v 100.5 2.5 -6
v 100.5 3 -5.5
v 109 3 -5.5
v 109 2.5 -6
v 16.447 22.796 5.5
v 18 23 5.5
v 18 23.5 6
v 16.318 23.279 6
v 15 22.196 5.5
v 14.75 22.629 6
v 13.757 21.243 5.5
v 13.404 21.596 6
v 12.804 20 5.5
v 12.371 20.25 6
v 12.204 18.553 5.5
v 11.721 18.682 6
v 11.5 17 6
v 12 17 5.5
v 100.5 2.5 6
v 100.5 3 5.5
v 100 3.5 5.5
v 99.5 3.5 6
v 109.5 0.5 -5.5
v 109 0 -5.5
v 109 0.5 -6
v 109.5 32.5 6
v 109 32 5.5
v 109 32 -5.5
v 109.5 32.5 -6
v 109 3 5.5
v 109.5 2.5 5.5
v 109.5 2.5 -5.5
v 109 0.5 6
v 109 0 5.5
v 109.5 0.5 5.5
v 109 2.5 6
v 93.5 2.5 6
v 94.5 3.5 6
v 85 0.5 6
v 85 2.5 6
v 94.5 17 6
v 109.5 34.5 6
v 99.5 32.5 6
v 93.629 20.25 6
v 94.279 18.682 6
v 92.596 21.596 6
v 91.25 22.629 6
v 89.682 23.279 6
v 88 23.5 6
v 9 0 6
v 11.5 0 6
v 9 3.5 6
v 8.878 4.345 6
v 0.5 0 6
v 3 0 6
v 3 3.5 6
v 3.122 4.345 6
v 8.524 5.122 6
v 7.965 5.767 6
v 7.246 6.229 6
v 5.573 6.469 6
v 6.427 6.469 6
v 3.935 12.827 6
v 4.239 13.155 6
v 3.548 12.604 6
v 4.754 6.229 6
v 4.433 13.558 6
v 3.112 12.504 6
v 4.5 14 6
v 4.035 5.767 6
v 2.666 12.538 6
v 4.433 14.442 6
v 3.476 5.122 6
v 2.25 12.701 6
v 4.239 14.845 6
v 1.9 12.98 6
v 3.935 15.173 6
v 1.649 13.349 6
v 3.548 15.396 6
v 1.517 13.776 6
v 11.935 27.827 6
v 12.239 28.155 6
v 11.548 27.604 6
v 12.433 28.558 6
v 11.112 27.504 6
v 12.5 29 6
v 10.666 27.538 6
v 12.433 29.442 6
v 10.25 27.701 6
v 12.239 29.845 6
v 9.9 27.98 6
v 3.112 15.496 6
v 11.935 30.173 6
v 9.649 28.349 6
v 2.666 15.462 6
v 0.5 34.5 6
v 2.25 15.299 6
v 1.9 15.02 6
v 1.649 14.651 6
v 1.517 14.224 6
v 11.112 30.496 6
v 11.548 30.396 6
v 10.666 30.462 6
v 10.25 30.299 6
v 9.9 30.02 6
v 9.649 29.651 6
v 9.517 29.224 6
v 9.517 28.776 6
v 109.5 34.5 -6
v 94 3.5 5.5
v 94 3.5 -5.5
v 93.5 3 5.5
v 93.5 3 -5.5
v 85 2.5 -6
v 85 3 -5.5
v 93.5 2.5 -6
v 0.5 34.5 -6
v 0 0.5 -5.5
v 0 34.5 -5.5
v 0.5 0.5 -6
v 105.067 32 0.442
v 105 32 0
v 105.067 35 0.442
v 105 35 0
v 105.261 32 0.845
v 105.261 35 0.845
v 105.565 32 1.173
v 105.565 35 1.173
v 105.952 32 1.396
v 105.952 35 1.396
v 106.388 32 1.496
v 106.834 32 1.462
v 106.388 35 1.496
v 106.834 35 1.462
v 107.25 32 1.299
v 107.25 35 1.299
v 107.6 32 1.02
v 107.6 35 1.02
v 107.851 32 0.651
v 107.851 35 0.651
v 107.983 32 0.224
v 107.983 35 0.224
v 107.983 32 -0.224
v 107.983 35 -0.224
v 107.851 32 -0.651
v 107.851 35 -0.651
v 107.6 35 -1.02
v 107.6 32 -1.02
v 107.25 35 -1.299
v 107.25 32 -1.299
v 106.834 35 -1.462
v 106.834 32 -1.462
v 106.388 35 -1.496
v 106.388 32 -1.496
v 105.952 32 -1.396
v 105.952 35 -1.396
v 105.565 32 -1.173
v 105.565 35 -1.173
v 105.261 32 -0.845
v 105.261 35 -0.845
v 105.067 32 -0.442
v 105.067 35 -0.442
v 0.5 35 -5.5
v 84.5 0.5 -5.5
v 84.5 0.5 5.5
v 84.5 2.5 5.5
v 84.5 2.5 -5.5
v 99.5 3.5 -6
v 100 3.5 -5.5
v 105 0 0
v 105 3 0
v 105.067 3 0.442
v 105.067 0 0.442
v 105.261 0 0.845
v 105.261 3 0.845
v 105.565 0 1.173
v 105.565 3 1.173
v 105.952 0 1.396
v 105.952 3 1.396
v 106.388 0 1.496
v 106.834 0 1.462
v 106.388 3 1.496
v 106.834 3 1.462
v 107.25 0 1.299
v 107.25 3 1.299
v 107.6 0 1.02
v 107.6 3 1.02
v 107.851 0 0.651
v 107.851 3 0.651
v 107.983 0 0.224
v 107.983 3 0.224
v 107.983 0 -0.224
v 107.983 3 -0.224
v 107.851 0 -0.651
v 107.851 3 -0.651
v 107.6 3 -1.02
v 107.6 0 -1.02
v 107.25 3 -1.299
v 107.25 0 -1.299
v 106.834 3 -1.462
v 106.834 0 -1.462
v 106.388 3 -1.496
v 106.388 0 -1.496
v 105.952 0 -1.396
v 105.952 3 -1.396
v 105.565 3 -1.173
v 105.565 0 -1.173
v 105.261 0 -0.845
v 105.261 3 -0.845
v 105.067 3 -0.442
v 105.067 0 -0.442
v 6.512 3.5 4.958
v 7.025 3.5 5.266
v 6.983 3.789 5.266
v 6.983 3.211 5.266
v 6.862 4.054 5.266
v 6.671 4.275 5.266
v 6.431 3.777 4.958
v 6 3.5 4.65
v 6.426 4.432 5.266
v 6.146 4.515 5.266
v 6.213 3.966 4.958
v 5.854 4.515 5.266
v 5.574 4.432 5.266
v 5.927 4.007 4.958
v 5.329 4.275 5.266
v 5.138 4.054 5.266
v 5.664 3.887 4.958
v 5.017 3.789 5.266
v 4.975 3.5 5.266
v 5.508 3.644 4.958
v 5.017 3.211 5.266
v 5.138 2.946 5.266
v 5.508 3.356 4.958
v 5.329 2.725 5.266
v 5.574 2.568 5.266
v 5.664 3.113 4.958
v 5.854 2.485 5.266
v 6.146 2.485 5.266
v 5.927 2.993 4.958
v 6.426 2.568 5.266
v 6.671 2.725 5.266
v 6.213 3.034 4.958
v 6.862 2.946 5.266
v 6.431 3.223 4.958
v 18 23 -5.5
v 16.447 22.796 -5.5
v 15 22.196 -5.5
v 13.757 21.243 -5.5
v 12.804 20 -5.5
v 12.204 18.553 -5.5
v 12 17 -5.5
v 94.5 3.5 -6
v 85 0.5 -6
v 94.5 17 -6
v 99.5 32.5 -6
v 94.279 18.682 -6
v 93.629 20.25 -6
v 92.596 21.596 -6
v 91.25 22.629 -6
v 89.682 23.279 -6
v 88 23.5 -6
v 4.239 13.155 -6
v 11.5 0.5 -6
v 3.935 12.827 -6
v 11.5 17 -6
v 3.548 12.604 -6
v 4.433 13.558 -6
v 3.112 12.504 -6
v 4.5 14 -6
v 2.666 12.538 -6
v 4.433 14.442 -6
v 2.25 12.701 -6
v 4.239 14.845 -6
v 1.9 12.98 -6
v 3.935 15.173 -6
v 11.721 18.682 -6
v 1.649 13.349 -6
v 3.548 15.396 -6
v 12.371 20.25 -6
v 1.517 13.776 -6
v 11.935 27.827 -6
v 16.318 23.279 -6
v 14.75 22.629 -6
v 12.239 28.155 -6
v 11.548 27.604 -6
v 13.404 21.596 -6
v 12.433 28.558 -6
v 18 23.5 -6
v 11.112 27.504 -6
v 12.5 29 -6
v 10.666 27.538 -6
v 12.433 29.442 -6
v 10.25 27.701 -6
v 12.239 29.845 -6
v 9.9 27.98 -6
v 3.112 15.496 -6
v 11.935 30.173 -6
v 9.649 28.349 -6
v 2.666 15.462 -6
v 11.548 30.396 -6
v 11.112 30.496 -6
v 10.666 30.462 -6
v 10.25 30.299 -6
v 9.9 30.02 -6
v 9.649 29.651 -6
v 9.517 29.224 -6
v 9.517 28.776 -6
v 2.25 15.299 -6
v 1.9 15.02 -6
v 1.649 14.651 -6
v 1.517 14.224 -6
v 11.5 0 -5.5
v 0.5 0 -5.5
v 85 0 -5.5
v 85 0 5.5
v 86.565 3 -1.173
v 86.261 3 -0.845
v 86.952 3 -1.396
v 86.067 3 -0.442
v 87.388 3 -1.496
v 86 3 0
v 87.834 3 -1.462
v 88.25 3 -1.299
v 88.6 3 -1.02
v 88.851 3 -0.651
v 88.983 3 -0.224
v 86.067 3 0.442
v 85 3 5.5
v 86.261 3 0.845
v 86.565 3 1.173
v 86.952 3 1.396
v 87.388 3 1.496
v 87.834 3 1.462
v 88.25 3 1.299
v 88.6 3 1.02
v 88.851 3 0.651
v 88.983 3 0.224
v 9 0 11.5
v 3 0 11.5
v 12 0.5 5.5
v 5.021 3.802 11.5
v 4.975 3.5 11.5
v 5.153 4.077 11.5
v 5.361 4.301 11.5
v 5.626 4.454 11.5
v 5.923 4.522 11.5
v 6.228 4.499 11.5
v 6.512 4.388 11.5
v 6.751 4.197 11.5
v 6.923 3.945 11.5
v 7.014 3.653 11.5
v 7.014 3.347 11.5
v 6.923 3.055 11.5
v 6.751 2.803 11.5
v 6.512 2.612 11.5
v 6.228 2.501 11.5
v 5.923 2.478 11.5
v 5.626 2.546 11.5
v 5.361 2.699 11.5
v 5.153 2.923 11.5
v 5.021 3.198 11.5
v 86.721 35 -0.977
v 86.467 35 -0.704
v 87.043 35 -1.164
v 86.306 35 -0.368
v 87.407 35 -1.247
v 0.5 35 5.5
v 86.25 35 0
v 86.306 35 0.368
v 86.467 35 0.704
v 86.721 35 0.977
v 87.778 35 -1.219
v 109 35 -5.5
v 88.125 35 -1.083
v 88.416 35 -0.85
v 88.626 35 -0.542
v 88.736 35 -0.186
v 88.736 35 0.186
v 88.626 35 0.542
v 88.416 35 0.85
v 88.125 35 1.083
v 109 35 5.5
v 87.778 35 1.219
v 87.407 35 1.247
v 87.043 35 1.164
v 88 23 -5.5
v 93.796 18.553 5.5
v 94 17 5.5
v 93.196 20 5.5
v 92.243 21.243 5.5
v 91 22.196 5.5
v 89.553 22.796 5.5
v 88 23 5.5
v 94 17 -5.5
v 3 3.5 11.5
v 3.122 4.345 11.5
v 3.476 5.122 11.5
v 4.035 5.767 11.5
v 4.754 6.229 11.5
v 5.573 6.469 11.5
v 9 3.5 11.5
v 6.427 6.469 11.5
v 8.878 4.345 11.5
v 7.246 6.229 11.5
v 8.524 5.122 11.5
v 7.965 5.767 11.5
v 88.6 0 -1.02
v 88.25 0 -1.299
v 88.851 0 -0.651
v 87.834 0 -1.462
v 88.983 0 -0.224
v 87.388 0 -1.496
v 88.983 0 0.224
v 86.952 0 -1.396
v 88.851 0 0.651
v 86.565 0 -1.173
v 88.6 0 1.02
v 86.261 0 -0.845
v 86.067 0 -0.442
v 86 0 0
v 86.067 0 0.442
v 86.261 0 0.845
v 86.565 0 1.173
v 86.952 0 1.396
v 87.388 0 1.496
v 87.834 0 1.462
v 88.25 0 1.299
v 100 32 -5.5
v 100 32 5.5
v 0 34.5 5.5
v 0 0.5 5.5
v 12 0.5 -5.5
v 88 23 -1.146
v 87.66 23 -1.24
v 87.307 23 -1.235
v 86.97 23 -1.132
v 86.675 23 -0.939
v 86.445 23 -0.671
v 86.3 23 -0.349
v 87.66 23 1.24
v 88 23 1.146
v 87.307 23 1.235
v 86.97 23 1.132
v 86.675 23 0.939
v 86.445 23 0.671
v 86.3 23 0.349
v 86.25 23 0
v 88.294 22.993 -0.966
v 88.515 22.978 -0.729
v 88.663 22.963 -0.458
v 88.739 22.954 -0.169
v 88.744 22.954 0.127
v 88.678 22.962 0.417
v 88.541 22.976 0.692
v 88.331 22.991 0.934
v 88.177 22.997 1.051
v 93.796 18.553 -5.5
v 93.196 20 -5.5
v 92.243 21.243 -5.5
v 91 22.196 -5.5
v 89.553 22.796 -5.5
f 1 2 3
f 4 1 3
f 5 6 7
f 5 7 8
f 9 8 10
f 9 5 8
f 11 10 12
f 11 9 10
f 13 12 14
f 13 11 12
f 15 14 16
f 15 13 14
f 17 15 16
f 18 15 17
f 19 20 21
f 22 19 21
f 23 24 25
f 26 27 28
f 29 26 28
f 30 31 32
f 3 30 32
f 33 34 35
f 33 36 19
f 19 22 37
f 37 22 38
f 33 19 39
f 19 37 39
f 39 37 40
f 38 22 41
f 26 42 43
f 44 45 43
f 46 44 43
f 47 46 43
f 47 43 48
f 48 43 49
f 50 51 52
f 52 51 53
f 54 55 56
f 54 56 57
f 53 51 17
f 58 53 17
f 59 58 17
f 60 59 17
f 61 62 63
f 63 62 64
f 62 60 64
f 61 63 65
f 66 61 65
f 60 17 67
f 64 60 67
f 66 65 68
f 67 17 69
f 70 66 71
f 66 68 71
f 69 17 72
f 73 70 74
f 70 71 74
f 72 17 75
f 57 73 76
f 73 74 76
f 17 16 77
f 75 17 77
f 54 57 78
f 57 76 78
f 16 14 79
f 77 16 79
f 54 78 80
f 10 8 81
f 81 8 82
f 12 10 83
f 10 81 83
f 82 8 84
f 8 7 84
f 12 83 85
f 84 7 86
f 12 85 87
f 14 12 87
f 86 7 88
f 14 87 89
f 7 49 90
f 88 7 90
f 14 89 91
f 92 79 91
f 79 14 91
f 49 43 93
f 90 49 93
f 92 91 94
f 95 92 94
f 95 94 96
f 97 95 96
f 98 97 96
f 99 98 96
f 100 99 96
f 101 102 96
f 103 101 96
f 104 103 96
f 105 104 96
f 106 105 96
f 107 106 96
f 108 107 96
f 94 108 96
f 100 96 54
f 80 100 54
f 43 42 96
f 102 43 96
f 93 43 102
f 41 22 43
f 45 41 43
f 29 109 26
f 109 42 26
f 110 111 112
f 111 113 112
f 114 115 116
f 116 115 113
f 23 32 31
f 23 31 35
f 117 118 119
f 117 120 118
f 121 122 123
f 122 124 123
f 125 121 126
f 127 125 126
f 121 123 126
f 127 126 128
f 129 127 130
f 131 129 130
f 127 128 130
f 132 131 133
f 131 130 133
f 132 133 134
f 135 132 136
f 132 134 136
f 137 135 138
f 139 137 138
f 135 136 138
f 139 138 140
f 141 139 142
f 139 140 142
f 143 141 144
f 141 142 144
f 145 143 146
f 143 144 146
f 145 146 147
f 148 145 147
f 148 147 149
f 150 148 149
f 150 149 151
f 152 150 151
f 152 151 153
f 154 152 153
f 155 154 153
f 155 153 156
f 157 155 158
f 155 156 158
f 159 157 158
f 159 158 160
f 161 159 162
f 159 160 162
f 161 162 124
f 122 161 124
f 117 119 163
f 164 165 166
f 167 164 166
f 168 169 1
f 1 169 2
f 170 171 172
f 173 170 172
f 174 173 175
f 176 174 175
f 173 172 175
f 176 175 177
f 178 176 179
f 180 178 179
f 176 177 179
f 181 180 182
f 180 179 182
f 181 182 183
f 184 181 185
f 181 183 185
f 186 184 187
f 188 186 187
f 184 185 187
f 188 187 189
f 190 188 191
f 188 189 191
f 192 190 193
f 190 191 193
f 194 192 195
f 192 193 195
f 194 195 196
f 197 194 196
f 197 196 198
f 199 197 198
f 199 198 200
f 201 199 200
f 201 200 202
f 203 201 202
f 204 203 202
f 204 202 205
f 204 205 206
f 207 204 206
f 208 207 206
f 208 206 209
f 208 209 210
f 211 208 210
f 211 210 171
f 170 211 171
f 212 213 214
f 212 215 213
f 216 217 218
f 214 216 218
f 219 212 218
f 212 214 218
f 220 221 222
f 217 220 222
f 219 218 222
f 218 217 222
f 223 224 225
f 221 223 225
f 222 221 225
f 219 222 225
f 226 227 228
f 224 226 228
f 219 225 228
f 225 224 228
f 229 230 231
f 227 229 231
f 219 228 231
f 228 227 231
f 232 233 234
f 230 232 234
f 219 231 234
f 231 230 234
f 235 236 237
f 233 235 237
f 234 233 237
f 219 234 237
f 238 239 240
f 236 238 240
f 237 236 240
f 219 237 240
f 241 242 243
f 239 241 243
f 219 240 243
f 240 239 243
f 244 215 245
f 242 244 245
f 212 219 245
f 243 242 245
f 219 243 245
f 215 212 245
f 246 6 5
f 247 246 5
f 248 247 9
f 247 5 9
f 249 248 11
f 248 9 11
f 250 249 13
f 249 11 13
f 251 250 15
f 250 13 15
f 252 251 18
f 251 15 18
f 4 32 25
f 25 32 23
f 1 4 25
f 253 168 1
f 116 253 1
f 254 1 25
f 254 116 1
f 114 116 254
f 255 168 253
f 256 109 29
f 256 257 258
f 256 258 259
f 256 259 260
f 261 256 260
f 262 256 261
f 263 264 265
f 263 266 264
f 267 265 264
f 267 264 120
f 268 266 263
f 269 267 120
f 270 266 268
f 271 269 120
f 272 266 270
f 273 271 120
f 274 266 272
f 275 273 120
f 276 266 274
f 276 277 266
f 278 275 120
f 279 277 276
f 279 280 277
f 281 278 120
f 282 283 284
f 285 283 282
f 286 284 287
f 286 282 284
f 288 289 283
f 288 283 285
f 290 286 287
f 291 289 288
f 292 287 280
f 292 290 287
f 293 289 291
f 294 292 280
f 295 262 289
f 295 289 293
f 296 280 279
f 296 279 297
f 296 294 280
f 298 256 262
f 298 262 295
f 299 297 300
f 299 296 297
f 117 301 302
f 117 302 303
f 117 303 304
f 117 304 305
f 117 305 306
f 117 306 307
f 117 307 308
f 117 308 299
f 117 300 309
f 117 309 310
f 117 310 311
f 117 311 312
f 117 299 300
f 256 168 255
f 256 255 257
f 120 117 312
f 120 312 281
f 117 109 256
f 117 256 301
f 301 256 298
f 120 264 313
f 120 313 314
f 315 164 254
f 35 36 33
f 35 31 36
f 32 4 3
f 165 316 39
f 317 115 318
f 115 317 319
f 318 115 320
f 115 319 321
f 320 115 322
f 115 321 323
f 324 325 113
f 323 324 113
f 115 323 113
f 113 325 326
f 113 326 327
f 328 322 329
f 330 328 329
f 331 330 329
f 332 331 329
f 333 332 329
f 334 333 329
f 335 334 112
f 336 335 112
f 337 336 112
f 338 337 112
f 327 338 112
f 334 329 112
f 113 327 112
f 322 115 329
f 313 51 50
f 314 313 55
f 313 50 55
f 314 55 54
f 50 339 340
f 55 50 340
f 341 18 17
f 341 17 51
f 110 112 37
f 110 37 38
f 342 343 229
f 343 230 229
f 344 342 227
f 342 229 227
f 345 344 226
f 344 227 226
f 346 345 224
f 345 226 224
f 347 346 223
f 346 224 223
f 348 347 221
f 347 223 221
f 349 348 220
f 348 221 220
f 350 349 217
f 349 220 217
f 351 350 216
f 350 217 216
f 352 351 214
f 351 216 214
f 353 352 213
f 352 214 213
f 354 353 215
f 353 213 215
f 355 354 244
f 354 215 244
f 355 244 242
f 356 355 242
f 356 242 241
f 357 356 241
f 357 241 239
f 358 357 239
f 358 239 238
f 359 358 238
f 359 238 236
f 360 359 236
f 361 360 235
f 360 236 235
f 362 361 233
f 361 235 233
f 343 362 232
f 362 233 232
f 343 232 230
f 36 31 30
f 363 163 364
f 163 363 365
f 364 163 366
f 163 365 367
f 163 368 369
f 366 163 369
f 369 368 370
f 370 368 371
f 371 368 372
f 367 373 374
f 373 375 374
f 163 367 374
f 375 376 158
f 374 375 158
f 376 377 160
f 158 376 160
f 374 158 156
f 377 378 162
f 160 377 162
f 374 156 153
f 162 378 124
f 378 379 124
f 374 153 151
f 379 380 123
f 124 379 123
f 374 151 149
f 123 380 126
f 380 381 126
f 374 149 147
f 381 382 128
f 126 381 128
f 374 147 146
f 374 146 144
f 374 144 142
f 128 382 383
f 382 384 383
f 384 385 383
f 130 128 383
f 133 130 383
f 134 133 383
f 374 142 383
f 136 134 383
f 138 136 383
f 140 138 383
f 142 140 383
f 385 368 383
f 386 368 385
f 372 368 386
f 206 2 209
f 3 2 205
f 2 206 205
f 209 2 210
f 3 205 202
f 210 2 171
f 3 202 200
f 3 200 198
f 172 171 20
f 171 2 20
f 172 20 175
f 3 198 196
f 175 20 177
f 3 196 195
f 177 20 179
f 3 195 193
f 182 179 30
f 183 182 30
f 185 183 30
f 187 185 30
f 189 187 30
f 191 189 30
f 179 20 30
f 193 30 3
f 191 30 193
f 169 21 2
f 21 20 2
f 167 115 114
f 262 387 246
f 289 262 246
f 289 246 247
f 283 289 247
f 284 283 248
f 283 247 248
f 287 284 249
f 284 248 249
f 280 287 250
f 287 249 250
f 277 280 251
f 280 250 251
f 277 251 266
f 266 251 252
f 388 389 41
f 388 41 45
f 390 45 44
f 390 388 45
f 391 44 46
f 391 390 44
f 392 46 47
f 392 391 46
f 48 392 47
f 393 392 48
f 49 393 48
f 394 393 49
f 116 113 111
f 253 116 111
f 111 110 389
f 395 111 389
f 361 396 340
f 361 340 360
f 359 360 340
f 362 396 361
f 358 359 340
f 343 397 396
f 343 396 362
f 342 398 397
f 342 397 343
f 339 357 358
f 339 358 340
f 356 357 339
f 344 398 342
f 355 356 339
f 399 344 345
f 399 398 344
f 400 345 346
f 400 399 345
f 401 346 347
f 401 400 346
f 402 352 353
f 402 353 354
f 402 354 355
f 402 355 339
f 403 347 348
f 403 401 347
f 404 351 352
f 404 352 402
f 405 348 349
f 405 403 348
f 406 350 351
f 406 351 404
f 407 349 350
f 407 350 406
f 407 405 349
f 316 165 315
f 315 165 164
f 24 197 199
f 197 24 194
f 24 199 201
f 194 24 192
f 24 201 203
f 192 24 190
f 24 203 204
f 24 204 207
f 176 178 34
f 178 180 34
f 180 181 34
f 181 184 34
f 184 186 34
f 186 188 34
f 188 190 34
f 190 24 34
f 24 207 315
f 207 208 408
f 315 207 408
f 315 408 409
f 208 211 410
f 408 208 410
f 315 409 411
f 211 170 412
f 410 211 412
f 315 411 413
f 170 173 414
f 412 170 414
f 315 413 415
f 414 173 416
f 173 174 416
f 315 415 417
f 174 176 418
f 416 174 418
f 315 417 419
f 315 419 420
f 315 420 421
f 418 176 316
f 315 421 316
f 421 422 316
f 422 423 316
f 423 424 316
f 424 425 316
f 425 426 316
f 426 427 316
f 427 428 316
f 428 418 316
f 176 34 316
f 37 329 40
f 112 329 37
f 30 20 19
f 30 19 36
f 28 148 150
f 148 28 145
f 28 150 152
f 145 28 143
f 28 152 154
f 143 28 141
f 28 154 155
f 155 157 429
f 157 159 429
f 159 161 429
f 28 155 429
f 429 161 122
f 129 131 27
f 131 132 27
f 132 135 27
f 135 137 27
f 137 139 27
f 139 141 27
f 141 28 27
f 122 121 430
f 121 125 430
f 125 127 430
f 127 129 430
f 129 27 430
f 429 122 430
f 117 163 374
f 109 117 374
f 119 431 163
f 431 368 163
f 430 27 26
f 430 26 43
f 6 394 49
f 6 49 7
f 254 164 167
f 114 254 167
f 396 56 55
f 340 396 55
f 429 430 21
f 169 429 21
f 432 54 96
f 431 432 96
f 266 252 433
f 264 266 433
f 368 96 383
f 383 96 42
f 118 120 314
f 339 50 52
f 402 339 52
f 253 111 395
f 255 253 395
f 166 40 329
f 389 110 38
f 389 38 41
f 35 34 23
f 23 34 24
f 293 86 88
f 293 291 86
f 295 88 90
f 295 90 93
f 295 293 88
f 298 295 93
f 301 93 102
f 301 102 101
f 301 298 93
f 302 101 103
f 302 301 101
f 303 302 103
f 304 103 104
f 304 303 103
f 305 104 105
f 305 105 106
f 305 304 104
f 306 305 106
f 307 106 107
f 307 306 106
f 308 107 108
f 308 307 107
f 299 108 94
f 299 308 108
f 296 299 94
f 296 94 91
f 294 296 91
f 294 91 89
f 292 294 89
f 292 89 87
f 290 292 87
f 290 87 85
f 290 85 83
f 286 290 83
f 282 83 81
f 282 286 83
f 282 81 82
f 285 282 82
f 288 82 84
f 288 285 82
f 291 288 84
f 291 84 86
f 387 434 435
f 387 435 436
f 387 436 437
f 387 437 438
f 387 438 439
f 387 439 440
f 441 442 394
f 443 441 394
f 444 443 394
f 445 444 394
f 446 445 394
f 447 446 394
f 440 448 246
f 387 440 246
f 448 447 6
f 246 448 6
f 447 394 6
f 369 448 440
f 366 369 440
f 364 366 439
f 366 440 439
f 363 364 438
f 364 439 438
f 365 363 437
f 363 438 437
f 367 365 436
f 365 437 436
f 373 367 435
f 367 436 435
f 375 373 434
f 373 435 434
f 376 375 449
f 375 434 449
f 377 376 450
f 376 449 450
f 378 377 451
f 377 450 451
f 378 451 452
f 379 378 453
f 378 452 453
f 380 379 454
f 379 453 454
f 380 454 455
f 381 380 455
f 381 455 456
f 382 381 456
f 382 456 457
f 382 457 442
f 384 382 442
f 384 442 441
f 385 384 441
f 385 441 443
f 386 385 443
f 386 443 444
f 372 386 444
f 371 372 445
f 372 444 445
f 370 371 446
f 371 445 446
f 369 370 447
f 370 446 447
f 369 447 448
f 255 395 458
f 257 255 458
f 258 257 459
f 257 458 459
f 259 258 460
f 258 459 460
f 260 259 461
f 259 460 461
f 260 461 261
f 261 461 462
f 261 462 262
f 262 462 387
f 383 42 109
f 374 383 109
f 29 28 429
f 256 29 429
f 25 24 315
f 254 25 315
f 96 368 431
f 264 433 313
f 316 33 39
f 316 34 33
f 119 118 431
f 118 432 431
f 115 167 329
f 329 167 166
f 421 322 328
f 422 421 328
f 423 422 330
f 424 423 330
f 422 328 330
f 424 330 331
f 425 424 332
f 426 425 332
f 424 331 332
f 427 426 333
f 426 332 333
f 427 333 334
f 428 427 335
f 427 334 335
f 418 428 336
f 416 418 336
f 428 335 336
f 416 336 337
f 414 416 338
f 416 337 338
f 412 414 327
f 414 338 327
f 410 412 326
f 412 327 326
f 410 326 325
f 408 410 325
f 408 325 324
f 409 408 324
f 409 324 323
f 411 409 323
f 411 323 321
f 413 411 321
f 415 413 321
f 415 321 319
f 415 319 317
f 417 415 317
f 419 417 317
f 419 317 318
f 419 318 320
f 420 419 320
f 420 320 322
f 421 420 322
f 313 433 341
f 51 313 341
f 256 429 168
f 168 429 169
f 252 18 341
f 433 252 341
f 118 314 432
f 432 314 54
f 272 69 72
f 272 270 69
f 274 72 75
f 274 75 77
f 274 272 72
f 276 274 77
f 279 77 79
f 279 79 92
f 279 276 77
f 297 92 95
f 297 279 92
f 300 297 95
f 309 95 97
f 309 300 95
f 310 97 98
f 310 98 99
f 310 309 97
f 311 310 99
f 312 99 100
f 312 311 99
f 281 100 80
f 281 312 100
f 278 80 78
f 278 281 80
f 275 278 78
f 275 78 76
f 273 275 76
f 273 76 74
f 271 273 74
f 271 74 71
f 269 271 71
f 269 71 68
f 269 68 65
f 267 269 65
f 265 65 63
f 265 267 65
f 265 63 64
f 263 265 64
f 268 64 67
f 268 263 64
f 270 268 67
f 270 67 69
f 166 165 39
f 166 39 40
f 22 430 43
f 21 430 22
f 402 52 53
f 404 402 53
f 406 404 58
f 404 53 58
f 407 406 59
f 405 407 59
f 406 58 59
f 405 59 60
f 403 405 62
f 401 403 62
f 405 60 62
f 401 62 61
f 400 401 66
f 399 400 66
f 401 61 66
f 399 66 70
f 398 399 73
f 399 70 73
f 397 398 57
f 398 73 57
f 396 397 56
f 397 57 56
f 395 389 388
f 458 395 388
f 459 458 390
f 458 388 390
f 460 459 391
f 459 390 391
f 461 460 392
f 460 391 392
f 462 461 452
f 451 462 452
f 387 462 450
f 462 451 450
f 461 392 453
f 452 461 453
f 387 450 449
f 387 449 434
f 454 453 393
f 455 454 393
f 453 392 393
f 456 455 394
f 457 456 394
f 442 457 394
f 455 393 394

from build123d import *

# Parameters (mm, degrees)
SKETCH1_R                    = 1.5
BOSS_EXTRUDE1_DEPTH          = 6
BOSS_EXTRUDE2_DEPTH          = 5.5
M2_5X0_45_TAPPED_HOLE1_D     = 2.05
M2_5X0_45_TAPPED_HOLE1_DEPTH = 6.234117865
M2_5X0_45_TAPPED_HOLE1_TIP   = 0.615882135
CUT_EXTRUDE1_REACH           = 116.658
SKETCH6_R                    = 1.5
CUT_EXTRUDE2_REACH           = 117.531
SKETCH7_R                    = 1.5
M3X0_5_TAPPED_HOLE1_D        = 2.5
M3X0_5_TAPPED_HOLE1_DEPTH    = 14.5
M3X0_5_TAPPED_HOLE1_TIP      = 0.751075774
CHAMFER1_SIZE                = 0.5


with BuildPart() as part:
    # Sketch1 → Boss-Extrude1 (new, symmetric)
    with BuildSketch(Plane.XY):
        with BuildLine():
            Line((0, 0), (0, 35))
            Line((0, 35), (109.5, 35))
            Line((109.5, 35), (109.5, 32))
            Line((109.5, 32), (100, 32))
            Line((100, 32), (100, 3))
            Line((100, 3), (109.5, 3))
            Line((109.5, 3), (109.5, 0))
            Line((109.5, 0), (84.5, 0))
            Line((84.5, 0), (84.5, 3))
            Line((84.5, 3), (94, 3))
            Line((94, 3), (94, 17))
            ThreePointArc((94, 17), (92.242640687, 21.242640687), (88, 23))
            Line((88, 23), (18, 23))
            ThreePointArc((18, 23), (13.757359313, 21.242640687), (12, 17))
            Line((12, 17), (12, 0))
            Line((12, 0), (0, 0))
        make_face()
        with Locations((11, 29)):
            Circle(SKETCH1_R, mode=Mode.SUBTRACT)
        with Locations((3, 14)):
            Circle(SKETCH1_R, mode=Mode.SUBTRACT)
    extrude(amount=BOSS_EXTRUDE1_DEPTH, both=True)

    # Sketch2 → Boss-Extrude2 (add)
    with BuildSketch(Plane.XY.offset(6)):
        with BuildLine():
            Line((3, 3.5), (3, 0))
            Line((3, 0), (9, 0))
            Line((9, 0), (9, 3.5))
            ThreePointArc((9, 3.5), (6, 6.5), (3, 3.5))
        make_face()
    extrude(amount=BOSS_EXTRUDE2_DEPTH)

    # M2.5x0.45 Tapped Hole1
    with Locations(Plane.XY.offset(11.5)):
        with Locations((6, 3.5)):
            Hole(M2_5X0_45_TAPPED_HOLE1_D / 2, depth=M2_5X0_45_TAPPED_HOLE1_DEPTH)
            with Locations((0, 0, -(M2_5X0_45_TAPPED_HOLE1_DEPTH + M2_5X0_45_TAPPED_HOLE1_TIP / 2))):  # 118° drill point
                Cone(0, M2_5X0_45_TAPPED_HOLE1_D / 2, M2_5X0_45_TAPPED_HOLE1_TIP, mode=Mode.SUBTRACT)

    # Sketch6 → Cut-Extrude1 (cut, up to next)
    with BuildSketch(Plane(origin=(0, 3, 0), x_dir=(1, 0, 0), z_dir=(0, 1, 0)), mode=Mode.PRIVATE) as cut_extrude1_sk1:
        with Locations(Location((87.5, 0, 0), (0, 0, 180))):
            Circle(SKETCH6_R)
    cut_extrude1_tool1 = extrude(cut_extrude1_sk1.sketch, amount=-CUT_EXTRUDE1_REACH, mode=Mode.PRIVATE) & part.part
    # Sketch6 → Cut-Extrude1 (cut, up to next)
    with BuildSketch(Plane(origin=(0, 3, 0), x_dir=(1, 0, 0), z_dir=(0, 1, 0)), mode=Mode.PRIVATE) as cut_extrude1_sk2:
        with Locations(Location((106.5, 0, 0), (0, 0, 180))):
            Circle(SKETCH6_R)
    cut_extrude1_tool2 = extrude(cut_extrude1_sk2.sketch, amount=-CUT_EXTRUDE1_REACH, mode=Mode.PRIVATE) & part.part
    add(cut_extrude1_tool1.solids().sort_by_distance((87.5, 3, 0))[0], mode=Mode.SUBTRACT)
    add(cut_extrude1_tool2.solids().sort_by_distance((106.5, 3, 0))[0], mode=Mode.SUBTRACT)

    # Sketch7 → Cut-Extrude2 (cut, up to next)
    with BuildSketch(Plane(origin=(0, 35, 0), x_dir=(1, 0, 0), z_dir=(0, 1, 0)), mode=Mode.PRIVATE) as cut_extrude2_sk1:
        with Locations(Location((106.5, 0, 0), (0, 0, 180))):
            Circle(SKETCH7_R)
    cut_extrude2_tool1 = extrude(cut_extrude2_sk1.sketch, amount=-CUT_EXTRUDE2_REACH, mode=Mode.PRIVATE) & part.part
    add(cut_extrude2_tool1.solids().sort_by_distance((106.5, 35, 0))[0], mode=Mode.SUBTRACT)

    # M3x0.5 Tapped Hole1
    with Locations(Plane(origin=(0, 35, 0), x_dir=(1, 0, 0), z_dir=(0, 1, 0))):
        with Locations((87.5, 0)):
            Hole(M3X0_5_TAPPED_HOLE1_D / 2, depth=M3X0_5_TAPPED_HOLE1_DEPTH)
            with Locations((0, 0, -(M3X0_5_TAPPED_HOLE1_DEPTH + M3X0_5_TAPPED_HOLE1_TIP / 2))):  # 118° drill point
                Cone(0, M3X0_5_TAPPED_HOLE1_D / 2, M3X0_5_TAPPED_HOLE1_TIP, mode=Mode.SUBTRACT)

    # Chamfer1
    chamfer1_edges = [part.edges().sort_by_distance(p)[0] for p in [
        (12, 8.5, -6),
        (12, 8.5, 6),
        (13.757359313, 21.242640687, -6),
        (13.757359313, 21.242640687, 6),
        (53, 23, -6),
        (53, 23, 6),
        (92.242640687, 21.242640687, -6),
        (92.242640687, 21.242640687, 6),
        (97, 0, 6),
        (109.5, 0, 0),
        (84.5, 0, 0),
        (94, 3, 0),
        (94, 10, -6),
        (89.25, 3, -6),
        (84.5, 1.5, 6),
        (94, 10, 6),
        (89.25, 3, 6),
        (84.5, 3, 0),
        (84.5, 1.5, -6),
        (97, 0, -6),
        (100, 3, 0),
        (109.5, 1.5, 6),
        (109.5, 1.5, -6),
        (104.75, 32, -6),
        (109.5, 32, 0),
        (104.75, 32, 6),
        (100, 17.5, -6),
        (104.75, 3, -6),
        (109.5, 3, 0),
        (104.75, 3, 6),
        (100, 17.5, 6),
        (0, 17.5, -6),
        (12, 0, 0),
        (6, 0, -6),
        (0, 35, 0),
        (0, 0, 0),
        (54.75, 35, -6),
        (109.5, 35, 0),
        (54.75, 35, 6),
        (0, 17.5, 6),
    ]]
    chamfer(chamfer1_edges, length=CHAMFER1_SIZE)


solid = part.part
